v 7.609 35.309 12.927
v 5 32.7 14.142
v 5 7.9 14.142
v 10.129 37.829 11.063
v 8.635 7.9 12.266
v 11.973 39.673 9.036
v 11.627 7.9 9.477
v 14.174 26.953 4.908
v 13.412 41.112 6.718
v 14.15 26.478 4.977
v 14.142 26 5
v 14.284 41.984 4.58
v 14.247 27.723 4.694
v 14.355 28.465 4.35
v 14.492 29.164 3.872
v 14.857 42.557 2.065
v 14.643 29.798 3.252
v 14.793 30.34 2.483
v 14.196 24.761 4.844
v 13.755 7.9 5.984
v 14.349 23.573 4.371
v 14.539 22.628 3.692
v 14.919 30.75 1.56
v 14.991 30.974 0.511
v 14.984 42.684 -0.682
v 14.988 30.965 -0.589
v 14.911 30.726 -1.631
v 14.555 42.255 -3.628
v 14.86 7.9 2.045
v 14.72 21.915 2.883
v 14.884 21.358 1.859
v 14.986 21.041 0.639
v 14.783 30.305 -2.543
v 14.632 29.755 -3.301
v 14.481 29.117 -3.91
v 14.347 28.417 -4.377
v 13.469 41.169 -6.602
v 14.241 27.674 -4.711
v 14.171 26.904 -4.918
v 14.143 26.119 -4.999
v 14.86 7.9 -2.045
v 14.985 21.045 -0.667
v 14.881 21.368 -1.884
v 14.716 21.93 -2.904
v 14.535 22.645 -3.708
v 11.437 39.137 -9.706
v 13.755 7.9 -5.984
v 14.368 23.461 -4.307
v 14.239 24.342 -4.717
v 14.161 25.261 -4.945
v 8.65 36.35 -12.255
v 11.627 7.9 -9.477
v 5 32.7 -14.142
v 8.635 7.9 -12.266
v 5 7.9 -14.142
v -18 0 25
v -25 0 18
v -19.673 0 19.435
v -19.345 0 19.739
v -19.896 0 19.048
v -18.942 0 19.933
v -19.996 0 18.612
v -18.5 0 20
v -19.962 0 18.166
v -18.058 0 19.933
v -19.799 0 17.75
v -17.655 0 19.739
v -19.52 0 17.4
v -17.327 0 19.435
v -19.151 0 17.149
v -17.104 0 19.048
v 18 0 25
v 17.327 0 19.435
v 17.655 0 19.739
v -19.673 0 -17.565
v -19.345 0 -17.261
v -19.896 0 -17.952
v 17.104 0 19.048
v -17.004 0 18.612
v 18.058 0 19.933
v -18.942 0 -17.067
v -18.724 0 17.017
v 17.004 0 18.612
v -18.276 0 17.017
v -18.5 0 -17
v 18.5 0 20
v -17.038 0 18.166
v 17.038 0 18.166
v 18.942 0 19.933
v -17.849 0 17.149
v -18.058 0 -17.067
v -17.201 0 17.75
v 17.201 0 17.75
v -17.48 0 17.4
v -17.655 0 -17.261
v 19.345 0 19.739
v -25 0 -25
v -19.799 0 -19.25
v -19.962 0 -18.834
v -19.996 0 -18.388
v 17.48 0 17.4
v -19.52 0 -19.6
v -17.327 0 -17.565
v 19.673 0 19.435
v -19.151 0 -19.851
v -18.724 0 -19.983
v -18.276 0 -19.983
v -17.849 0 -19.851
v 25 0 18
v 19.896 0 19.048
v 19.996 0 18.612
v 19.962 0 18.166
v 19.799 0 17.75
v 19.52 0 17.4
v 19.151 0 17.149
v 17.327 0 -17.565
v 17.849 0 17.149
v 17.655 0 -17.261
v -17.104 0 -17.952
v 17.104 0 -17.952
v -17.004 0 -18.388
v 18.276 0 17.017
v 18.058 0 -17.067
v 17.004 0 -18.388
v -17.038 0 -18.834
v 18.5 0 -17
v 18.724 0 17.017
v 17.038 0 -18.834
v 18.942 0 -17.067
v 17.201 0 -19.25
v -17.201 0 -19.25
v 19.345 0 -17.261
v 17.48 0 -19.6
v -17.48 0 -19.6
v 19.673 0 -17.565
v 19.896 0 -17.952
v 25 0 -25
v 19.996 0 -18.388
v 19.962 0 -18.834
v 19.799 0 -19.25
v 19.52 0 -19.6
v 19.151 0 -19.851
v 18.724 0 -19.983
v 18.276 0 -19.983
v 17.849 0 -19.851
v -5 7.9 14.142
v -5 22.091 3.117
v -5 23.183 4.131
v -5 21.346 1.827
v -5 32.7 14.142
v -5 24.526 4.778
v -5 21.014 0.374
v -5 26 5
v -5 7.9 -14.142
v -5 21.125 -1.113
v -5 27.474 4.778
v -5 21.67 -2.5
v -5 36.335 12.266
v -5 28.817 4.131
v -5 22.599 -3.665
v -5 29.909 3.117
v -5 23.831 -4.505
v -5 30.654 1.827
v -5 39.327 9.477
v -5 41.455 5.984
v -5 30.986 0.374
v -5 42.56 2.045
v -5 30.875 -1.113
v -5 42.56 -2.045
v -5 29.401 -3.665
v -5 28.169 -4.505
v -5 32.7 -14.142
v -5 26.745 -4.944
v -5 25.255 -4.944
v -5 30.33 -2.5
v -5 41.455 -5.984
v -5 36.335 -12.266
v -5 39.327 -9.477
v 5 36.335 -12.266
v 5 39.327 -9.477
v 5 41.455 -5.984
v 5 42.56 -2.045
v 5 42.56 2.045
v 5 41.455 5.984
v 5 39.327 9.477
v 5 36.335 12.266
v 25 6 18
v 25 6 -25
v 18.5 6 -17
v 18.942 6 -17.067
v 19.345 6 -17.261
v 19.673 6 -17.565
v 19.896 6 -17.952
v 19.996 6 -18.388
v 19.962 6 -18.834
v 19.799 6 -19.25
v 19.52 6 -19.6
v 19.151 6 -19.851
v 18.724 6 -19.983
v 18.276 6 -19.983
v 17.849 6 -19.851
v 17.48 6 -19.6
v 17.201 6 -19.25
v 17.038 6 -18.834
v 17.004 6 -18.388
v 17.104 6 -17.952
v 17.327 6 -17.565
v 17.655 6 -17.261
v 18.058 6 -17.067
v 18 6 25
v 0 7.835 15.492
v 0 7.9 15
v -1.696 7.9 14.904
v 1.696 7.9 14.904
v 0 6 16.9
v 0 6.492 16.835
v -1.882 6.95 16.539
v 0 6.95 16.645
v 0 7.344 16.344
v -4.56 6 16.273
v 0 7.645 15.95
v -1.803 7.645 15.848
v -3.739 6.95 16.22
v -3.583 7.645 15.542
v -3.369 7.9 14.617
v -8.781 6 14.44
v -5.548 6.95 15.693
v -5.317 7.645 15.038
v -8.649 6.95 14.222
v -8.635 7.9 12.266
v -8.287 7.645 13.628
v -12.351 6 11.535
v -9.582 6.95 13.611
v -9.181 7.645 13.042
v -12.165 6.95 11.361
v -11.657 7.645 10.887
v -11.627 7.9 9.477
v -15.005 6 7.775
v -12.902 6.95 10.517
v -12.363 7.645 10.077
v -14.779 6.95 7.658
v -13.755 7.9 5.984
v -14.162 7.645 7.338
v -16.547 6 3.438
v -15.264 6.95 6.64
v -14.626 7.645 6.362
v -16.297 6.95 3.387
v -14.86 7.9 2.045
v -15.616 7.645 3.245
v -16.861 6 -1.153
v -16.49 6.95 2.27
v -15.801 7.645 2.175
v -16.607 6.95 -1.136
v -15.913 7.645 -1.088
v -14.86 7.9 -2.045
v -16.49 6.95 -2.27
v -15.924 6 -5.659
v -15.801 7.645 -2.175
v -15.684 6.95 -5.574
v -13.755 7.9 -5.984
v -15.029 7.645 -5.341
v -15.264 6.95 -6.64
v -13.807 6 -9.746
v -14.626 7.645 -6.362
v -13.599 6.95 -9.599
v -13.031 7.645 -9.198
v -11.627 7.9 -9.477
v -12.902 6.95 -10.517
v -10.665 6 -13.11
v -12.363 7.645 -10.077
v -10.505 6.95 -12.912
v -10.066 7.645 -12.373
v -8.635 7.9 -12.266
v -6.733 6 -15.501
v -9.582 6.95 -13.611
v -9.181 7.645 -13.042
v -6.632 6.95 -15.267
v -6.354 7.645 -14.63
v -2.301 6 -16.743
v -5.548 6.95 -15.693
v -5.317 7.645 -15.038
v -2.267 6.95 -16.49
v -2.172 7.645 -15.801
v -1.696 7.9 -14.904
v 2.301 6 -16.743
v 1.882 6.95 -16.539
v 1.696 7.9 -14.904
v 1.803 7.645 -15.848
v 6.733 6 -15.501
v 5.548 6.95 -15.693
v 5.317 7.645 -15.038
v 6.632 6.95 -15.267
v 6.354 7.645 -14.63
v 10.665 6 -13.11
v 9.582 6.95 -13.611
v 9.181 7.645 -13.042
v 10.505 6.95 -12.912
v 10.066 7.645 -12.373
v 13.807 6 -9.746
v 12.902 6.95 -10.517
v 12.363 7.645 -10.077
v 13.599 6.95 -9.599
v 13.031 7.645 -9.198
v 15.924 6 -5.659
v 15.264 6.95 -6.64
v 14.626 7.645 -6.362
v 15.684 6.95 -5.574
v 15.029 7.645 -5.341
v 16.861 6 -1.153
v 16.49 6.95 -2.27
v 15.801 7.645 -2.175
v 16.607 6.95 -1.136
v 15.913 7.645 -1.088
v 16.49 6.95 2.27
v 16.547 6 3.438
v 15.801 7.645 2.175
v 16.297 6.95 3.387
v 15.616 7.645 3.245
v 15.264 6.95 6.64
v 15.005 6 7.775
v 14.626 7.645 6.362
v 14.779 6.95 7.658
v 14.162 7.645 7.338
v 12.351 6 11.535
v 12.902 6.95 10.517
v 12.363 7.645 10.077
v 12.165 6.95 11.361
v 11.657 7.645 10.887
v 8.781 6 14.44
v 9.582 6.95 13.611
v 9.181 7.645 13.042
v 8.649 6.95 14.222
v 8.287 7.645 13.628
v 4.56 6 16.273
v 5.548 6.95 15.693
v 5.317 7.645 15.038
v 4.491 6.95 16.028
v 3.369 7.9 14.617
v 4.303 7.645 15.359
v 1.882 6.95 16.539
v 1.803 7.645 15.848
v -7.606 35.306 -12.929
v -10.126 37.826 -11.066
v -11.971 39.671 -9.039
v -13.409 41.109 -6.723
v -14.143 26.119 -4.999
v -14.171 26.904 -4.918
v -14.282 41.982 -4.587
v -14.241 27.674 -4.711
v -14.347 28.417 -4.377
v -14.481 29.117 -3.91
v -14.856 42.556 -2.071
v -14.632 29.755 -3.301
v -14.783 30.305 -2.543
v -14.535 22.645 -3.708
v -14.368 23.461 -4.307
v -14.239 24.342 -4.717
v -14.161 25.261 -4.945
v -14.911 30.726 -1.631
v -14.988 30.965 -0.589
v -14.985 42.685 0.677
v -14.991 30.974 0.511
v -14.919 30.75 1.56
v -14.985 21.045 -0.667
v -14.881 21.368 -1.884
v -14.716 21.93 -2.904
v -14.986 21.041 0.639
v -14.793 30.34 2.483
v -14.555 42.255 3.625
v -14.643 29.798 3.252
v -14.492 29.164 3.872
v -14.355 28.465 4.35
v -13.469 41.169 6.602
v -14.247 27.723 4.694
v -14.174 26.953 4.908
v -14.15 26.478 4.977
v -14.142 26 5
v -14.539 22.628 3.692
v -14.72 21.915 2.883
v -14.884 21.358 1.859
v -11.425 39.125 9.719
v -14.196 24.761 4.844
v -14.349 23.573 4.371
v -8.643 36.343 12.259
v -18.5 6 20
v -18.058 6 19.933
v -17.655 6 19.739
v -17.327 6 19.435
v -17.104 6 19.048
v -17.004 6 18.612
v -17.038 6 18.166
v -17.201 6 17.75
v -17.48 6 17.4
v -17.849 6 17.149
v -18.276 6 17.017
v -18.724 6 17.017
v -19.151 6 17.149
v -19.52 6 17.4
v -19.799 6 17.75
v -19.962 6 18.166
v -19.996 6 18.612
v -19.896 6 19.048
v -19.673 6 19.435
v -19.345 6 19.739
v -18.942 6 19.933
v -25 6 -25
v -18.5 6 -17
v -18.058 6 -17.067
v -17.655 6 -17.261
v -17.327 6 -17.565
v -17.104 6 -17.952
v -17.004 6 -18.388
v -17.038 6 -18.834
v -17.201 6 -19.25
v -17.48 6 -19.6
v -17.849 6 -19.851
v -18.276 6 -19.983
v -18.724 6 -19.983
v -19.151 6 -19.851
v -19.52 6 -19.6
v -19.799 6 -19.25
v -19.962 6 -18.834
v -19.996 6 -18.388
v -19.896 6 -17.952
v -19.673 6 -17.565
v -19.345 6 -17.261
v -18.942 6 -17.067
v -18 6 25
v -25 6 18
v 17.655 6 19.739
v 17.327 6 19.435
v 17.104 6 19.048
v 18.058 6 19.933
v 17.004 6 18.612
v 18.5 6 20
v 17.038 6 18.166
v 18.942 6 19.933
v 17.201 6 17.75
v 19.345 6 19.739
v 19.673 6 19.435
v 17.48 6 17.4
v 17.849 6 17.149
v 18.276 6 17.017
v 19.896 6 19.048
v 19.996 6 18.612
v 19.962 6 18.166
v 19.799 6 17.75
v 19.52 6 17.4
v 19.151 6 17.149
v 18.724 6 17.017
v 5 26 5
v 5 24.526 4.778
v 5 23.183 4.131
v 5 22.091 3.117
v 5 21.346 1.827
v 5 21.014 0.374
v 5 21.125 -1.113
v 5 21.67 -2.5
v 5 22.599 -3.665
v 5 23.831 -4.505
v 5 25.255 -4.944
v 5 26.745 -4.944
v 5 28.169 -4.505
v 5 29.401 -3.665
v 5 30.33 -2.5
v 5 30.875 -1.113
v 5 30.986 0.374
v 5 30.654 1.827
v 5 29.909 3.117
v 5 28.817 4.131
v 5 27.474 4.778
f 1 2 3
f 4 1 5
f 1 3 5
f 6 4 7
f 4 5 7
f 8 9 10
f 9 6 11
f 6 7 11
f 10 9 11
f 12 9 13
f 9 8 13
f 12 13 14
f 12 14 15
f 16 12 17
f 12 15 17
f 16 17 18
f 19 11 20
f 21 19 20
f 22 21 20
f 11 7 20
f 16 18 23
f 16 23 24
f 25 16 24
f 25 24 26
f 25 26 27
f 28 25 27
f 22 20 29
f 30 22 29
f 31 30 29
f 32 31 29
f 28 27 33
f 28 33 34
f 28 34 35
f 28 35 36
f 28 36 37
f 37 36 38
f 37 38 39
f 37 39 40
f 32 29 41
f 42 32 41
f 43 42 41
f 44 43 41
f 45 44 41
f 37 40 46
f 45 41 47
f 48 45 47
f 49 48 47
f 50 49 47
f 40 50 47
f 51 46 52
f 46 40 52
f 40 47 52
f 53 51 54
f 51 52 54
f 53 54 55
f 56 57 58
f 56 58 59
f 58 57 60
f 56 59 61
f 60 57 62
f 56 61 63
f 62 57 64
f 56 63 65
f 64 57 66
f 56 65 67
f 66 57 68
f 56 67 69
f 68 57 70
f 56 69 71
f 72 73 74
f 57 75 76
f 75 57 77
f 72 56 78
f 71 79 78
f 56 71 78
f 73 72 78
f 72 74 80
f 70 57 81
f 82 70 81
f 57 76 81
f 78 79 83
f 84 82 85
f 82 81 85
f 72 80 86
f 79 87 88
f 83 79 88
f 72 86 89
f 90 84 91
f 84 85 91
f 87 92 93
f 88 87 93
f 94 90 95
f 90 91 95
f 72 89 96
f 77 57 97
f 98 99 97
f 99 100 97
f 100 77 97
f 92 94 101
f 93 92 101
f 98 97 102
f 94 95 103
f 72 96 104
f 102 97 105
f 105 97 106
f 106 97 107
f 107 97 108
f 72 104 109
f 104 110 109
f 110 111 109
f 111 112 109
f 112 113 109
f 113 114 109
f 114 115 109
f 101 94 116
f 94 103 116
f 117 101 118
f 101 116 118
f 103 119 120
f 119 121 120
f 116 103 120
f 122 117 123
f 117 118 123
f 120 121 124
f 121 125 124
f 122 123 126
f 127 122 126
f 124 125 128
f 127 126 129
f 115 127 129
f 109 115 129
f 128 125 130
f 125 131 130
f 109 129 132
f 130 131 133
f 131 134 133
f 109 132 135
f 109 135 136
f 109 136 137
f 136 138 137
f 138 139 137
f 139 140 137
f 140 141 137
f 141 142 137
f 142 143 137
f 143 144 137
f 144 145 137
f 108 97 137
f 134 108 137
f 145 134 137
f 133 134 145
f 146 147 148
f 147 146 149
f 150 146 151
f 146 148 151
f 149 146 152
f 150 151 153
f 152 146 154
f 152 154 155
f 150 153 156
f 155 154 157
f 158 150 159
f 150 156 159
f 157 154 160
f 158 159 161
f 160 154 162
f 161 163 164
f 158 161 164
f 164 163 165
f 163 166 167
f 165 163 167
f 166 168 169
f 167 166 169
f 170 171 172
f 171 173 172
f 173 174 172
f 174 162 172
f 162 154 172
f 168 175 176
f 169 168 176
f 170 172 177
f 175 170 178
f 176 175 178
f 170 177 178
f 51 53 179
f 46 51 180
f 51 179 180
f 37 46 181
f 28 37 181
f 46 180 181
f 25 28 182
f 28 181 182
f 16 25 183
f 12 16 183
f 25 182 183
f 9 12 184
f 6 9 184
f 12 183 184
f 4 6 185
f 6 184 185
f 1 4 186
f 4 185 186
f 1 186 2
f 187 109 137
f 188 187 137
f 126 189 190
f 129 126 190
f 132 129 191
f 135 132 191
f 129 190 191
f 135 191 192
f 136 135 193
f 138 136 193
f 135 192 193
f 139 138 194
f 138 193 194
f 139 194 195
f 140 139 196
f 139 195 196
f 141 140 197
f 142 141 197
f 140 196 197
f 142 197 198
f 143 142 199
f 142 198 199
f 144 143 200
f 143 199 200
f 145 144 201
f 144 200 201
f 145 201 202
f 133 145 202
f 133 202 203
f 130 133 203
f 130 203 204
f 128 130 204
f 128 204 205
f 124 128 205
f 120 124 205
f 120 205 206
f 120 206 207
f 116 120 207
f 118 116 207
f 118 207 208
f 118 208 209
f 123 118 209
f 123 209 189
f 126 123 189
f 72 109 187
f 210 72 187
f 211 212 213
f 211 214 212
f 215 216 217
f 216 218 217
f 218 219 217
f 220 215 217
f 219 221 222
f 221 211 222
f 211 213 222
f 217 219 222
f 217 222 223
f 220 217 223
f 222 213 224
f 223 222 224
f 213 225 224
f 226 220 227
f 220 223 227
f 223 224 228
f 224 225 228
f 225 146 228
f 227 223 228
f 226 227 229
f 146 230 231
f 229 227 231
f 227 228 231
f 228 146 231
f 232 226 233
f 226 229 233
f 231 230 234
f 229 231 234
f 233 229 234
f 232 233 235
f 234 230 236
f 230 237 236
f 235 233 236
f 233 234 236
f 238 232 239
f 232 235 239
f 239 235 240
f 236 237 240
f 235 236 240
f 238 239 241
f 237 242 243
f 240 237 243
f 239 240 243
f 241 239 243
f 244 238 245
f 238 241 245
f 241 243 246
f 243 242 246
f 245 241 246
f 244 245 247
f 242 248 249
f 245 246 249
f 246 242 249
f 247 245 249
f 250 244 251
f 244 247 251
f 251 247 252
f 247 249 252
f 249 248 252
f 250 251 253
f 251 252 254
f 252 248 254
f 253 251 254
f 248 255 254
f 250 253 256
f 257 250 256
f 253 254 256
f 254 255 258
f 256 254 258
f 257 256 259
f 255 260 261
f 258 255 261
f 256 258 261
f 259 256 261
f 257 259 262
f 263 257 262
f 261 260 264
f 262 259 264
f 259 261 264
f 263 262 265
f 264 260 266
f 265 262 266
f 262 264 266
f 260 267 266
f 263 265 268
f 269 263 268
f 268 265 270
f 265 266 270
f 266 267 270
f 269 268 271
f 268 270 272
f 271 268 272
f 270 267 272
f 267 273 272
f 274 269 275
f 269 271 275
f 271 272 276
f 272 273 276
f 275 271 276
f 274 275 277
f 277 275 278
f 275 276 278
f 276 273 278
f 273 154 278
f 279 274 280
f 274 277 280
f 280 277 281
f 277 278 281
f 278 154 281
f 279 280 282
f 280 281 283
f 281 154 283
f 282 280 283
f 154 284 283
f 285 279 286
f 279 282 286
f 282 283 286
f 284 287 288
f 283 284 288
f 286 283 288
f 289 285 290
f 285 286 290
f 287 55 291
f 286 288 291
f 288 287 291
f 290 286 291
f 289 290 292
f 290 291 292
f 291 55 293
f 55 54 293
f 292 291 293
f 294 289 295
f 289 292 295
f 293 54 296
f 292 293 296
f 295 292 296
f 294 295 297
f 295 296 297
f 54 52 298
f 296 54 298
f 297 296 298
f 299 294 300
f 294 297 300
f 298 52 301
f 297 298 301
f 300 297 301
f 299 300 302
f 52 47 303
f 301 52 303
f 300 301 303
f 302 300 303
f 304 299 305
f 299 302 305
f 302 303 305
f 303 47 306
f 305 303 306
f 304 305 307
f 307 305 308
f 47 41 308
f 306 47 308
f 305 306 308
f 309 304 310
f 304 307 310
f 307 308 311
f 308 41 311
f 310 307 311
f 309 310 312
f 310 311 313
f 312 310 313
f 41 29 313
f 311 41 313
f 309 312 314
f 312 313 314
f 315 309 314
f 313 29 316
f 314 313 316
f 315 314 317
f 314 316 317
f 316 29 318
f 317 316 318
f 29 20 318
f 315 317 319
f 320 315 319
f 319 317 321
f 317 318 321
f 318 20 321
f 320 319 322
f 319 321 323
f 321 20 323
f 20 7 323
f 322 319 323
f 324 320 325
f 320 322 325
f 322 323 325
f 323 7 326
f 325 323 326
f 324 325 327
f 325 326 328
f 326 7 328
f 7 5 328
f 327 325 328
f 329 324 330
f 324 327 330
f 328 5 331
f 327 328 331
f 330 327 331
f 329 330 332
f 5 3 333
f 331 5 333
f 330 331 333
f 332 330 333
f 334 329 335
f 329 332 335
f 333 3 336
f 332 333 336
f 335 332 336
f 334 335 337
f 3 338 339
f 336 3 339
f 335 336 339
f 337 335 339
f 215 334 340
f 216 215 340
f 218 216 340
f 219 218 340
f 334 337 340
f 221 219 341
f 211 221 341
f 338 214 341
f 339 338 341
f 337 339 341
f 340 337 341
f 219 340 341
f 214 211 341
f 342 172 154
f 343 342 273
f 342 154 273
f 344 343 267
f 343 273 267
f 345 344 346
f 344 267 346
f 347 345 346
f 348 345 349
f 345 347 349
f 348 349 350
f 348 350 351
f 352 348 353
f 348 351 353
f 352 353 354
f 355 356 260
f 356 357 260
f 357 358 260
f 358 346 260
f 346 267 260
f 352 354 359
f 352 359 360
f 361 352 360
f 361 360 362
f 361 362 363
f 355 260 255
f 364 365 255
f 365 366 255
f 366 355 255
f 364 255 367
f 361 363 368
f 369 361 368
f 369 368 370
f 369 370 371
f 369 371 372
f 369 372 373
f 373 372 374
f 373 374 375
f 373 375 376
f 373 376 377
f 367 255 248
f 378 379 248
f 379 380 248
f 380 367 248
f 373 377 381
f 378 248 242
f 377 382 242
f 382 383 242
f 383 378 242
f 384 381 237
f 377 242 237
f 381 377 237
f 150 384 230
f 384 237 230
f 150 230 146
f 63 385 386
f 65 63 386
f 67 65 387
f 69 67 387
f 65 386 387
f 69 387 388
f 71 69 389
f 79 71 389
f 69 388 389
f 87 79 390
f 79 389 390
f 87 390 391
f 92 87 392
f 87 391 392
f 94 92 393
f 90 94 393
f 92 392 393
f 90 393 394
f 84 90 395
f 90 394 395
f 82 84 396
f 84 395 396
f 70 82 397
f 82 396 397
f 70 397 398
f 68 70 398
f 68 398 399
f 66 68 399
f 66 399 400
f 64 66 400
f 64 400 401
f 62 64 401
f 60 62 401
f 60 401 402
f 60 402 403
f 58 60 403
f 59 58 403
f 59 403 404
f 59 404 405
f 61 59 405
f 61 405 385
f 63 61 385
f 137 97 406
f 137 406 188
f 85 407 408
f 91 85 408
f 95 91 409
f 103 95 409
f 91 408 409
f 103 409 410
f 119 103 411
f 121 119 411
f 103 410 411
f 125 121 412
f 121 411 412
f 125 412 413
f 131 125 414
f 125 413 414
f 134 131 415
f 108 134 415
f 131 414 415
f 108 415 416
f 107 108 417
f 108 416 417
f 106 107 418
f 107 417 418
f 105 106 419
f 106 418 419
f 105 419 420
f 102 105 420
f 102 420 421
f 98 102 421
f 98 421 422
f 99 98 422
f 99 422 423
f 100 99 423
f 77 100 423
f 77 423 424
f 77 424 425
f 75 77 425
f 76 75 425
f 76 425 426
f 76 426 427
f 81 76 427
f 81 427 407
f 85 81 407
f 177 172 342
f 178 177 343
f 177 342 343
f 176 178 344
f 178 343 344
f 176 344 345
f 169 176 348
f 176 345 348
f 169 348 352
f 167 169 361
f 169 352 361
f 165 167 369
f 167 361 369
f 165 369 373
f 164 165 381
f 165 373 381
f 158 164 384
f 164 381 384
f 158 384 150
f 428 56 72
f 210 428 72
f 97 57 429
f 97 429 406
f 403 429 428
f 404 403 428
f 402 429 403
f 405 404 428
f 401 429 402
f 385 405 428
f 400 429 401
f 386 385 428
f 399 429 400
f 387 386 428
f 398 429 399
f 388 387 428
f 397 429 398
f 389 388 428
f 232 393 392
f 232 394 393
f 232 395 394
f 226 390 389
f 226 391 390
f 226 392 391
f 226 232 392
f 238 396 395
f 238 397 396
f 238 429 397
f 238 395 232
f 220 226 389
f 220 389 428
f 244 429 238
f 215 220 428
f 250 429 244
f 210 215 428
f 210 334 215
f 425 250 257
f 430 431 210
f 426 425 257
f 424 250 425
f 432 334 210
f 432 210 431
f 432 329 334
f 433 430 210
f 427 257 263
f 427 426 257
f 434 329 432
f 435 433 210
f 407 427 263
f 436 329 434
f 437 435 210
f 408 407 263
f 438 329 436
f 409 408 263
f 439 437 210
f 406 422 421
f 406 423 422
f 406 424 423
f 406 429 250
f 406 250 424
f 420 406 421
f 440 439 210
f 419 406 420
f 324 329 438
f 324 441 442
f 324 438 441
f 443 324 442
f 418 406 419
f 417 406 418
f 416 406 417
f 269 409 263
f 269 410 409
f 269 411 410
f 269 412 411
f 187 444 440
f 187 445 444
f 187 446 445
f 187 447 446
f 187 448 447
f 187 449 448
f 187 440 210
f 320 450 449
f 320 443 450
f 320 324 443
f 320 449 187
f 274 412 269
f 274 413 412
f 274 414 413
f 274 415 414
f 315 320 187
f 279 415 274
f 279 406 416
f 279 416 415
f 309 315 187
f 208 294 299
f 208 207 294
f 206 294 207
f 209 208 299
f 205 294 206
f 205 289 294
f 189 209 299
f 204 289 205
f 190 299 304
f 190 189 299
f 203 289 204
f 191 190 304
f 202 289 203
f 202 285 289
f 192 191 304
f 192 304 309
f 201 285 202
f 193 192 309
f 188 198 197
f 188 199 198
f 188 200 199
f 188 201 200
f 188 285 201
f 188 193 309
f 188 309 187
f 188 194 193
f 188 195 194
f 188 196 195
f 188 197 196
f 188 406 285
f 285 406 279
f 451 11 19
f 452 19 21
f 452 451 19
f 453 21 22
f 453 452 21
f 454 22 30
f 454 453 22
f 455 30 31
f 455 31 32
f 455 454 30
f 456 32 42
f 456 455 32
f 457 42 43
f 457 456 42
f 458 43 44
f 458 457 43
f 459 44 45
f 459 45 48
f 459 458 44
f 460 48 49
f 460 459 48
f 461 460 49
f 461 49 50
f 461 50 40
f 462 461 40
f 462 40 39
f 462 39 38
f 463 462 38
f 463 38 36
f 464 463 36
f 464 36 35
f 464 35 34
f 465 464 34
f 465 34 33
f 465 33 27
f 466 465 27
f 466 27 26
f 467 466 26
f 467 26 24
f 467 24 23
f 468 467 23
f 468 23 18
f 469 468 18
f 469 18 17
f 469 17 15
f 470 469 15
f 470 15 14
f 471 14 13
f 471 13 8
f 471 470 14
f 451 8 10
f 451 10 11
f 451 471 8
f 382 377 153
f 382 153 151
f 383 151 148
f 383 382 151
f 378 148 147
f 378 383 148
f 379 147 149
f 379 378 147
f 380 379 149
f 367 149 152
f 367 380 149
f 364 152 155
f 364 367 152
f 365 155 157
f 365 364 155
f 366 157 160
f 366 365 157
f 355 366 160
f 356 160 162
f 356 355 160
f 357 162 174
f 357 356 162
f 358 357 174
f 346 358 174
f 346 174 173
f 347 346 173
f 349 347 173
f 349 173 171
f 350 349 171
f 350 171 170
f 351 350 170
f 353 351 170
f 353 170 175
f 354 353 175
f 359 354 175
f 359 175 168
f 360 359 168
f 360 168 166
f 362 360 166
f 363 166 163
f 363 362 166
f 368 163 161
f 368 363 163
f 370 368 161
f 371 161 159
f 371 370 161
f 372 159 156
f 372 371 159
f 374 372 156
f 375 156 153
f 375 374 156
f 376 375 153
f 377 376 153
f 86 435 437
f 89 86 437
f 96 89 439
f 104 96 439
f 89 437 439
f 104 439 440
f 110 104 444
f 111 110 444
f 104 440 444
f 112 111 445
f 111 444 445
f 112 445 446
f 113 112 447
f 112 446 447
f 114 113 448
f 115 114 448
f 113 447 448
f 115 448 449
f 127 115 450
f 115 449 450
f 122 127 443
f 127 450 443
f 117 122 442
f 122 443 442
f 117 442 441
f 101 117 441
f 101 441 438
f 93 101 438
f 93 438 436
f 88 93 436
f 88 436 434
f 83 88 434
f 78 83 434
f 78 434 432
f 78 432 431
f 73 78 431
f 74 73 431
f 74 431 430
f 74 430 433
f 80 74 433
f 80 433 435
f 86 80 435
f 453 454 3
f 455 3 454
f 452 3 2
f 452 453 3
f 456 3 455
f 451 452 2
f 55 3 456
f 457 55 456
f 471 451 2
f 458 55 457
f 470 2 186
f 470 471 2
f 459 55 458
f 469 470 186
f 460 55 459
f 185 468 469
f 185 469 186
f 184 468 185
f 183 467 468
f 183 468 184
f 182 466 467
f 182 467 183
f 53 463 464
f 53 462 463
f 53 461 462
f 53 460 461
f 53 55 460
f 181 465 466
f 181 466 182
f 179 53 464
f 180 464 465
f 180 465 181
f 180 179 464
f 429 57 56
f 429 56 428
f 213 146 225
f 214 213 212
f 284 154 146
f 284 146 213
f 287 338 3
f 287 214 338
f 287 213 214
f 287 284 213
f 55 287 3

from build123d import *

# Parameters (mm, degrees)
SKETCH1_W               = 50
SKETCH1_H               = 50
BOSS_EXTRUDE1_DEPTH     = 6
SKETCH2_R               = 15
BOSS_EXTRUDE2_DEPTH     = 36.7
CHAMFER1_SIZE           = 7
CUT_EXTRUDE1_DEPTH      = 36.7
CUT_EXTRUDE1_DEPTH_BACK = 36.7
SKETCH3_W               = 10
SKETCH3_H               = 35.728035611
CUT_EXTRUDE2_DEPTH      = 36.7
CUT_EXTRUDE2_DEPTH_BACK = 36.7
CUT_EXTRUDE3_DEPTH      = 36.7
CUT_EXTRUDE3_DEPTH_BACK = 36.7
SKETCH5_R               = 5
SKETCH7_R               = 1.5
CUT_EXTRUDE4_DEPTH      = 9
CHAMFER2_SIZE           = 7


with BuildPart() as part:
    # Sketch1 → Boss-Extrude1 (new body)
    with BuildSketch(Plane(origin=(0, 0, 0), x_dir=(1, 0, 0), z_dir=(0, 1, 0))):
        Rectangle(SKETCH1_W, SKETCH1_H)
    extrude(amount=BOSS_EXTRUDE1_DEPTH)

    # Sketch2 → Boss-Extrude2 (add)
    with BuildSketch(Plane(origin=(0, 6, 0), x_dir=(1, 0, 0), z_dir=(0, 1, 0))):
        with Locations(Location((0, 0, 0), (0, 0, 270))):
            Circle(SKETCH2_R)
    extrude(amount=BOSS_EXTRUDE2_DEPTH)

    # Chamfer1
    chamfer1_edges = [part.edges().sort_by_distance(p)[0] for p in [
        (25, 3, 25),
    ]]
    chamfer(chamfer1_edges, length=CHAMFER1_SIZE)

    # Sketch3 → Cut-Extrude1 (cut, two sides: drawn at the far end of the back side and taken through both)
    with BuildSketch(Plane.XY.offset(-CUT_EXTRUDE1_DEPTH_BACK)):
        with Locations((0, 25.764017805)):
            Rectangle(SKETCH3_W, SKETCH3_H)
    extrude(amount=CUT_EXTRUDE1_DEPTH + CUT_EXTRUDE1_DEPTH_BACK, mode=Mode.SUBTRACT)

    # Sketch4 → Cut-Extrude2 (cut, two sides: drawn at the far end of the back side and taken through both)
    with BuildSketch(Plane(origin=(0, 0, 0), x_dir=(0, 0, -1), z_dir=(1, 0, 0)).offset(-CUT_EXTRUDE2_DEPTH_BACK)):
        with BuildLine():
            Line((-14.375997607, 31.981435834), (-17.281195567, 49.289848302))
            Line((-17.281195567, 49.289848302), (26.224300548, 49.289848302))
            Line((26.224300548, 49.289848302), (14.47548732, 31.631954585))
            ThreePointArc((14.47548732, 31.631954585), (0.181683341, 42.698899665), (-14.375997607, 31.981435834))
        make_face()
    extrude(amount=CUT_EXTRUDE2_DEPTH + CUT_EXTRUDE2_DEPTH_BACK, mode=Mode.SUBTRACT)

    # Sketch5 → Cut-Extrude3 (cut, two sides: drawn at the far end of the back side and taken through both)
    with BuildSketch(Plane(origin=(0, 0, 0), x_dir=(0, 0, -1), z_dir=(1, 0, 0)).offset(-CUT_EXTRUDE3_DEPTH_BACK)):
        with Locations(Location((0, 26, 0), (0, 0, 180))):
            Circle(SKETCH5_R)
    extrude(amount=CUT_EXTRUDE3_DEPTH + CUT_EXTRUDE3_DEPTH_BACK, mode=Mode.SUBTRACT)

    # Sketch6 → Revolve1 (revolve)
    with BuildSketch(Plane(origin=(0, 0, 0), x_dir=(0, 0, -1), z_dir=(1, 0, 0))):
        with BuildLine():
            Line((-15, 7.9), (-15, 6))
            Line((-15, 6), (-16.9, 6))
            ThreePointArc((-16.9, 6), (-16.343502884, 7.343502884), (-15, 7.9))
        make_face()
    revolve(axis=Axis((0, 42.7, 0), (0, -1, 0)))

    # Sketch7 → Cut-Extrude4 (cut)
    with BuildSketch(Plane(origin=(0, 6, 0), x_dir=(1, 0, 0), z_dir=(0, 1, 0))):
        with Locations(Location((-18.5, 18.5, 0), (0, 0, 270))):
            Circle(SKETCH7_R)
        with Locations(Location((18.5, 18.5, 0), (0, 0, 270))):
            Circle(SKETCH7_R)
        with Locations(Location((18.5, -18.5, 0), (0, 0, 270))):
            Circle(SKETCH7_R)
        with Locations(Location((-18.5, -18.5, 0), (0, 0, 270))):
            Circle(SKETCH7_R)
    extrude(amount=-CUT_EXTRUDE4_DEPTH, mode=Mode.SUBTRACT)

    # Chamfer2
    chamfer2_edges = [part.edges().sort_by_distance(p)[0] for p in [
        (-25, 3, 25),
    ]]
    chamfer(chamfer2_edges, length=CHAMFER2_SIZE)


solid = part.part
